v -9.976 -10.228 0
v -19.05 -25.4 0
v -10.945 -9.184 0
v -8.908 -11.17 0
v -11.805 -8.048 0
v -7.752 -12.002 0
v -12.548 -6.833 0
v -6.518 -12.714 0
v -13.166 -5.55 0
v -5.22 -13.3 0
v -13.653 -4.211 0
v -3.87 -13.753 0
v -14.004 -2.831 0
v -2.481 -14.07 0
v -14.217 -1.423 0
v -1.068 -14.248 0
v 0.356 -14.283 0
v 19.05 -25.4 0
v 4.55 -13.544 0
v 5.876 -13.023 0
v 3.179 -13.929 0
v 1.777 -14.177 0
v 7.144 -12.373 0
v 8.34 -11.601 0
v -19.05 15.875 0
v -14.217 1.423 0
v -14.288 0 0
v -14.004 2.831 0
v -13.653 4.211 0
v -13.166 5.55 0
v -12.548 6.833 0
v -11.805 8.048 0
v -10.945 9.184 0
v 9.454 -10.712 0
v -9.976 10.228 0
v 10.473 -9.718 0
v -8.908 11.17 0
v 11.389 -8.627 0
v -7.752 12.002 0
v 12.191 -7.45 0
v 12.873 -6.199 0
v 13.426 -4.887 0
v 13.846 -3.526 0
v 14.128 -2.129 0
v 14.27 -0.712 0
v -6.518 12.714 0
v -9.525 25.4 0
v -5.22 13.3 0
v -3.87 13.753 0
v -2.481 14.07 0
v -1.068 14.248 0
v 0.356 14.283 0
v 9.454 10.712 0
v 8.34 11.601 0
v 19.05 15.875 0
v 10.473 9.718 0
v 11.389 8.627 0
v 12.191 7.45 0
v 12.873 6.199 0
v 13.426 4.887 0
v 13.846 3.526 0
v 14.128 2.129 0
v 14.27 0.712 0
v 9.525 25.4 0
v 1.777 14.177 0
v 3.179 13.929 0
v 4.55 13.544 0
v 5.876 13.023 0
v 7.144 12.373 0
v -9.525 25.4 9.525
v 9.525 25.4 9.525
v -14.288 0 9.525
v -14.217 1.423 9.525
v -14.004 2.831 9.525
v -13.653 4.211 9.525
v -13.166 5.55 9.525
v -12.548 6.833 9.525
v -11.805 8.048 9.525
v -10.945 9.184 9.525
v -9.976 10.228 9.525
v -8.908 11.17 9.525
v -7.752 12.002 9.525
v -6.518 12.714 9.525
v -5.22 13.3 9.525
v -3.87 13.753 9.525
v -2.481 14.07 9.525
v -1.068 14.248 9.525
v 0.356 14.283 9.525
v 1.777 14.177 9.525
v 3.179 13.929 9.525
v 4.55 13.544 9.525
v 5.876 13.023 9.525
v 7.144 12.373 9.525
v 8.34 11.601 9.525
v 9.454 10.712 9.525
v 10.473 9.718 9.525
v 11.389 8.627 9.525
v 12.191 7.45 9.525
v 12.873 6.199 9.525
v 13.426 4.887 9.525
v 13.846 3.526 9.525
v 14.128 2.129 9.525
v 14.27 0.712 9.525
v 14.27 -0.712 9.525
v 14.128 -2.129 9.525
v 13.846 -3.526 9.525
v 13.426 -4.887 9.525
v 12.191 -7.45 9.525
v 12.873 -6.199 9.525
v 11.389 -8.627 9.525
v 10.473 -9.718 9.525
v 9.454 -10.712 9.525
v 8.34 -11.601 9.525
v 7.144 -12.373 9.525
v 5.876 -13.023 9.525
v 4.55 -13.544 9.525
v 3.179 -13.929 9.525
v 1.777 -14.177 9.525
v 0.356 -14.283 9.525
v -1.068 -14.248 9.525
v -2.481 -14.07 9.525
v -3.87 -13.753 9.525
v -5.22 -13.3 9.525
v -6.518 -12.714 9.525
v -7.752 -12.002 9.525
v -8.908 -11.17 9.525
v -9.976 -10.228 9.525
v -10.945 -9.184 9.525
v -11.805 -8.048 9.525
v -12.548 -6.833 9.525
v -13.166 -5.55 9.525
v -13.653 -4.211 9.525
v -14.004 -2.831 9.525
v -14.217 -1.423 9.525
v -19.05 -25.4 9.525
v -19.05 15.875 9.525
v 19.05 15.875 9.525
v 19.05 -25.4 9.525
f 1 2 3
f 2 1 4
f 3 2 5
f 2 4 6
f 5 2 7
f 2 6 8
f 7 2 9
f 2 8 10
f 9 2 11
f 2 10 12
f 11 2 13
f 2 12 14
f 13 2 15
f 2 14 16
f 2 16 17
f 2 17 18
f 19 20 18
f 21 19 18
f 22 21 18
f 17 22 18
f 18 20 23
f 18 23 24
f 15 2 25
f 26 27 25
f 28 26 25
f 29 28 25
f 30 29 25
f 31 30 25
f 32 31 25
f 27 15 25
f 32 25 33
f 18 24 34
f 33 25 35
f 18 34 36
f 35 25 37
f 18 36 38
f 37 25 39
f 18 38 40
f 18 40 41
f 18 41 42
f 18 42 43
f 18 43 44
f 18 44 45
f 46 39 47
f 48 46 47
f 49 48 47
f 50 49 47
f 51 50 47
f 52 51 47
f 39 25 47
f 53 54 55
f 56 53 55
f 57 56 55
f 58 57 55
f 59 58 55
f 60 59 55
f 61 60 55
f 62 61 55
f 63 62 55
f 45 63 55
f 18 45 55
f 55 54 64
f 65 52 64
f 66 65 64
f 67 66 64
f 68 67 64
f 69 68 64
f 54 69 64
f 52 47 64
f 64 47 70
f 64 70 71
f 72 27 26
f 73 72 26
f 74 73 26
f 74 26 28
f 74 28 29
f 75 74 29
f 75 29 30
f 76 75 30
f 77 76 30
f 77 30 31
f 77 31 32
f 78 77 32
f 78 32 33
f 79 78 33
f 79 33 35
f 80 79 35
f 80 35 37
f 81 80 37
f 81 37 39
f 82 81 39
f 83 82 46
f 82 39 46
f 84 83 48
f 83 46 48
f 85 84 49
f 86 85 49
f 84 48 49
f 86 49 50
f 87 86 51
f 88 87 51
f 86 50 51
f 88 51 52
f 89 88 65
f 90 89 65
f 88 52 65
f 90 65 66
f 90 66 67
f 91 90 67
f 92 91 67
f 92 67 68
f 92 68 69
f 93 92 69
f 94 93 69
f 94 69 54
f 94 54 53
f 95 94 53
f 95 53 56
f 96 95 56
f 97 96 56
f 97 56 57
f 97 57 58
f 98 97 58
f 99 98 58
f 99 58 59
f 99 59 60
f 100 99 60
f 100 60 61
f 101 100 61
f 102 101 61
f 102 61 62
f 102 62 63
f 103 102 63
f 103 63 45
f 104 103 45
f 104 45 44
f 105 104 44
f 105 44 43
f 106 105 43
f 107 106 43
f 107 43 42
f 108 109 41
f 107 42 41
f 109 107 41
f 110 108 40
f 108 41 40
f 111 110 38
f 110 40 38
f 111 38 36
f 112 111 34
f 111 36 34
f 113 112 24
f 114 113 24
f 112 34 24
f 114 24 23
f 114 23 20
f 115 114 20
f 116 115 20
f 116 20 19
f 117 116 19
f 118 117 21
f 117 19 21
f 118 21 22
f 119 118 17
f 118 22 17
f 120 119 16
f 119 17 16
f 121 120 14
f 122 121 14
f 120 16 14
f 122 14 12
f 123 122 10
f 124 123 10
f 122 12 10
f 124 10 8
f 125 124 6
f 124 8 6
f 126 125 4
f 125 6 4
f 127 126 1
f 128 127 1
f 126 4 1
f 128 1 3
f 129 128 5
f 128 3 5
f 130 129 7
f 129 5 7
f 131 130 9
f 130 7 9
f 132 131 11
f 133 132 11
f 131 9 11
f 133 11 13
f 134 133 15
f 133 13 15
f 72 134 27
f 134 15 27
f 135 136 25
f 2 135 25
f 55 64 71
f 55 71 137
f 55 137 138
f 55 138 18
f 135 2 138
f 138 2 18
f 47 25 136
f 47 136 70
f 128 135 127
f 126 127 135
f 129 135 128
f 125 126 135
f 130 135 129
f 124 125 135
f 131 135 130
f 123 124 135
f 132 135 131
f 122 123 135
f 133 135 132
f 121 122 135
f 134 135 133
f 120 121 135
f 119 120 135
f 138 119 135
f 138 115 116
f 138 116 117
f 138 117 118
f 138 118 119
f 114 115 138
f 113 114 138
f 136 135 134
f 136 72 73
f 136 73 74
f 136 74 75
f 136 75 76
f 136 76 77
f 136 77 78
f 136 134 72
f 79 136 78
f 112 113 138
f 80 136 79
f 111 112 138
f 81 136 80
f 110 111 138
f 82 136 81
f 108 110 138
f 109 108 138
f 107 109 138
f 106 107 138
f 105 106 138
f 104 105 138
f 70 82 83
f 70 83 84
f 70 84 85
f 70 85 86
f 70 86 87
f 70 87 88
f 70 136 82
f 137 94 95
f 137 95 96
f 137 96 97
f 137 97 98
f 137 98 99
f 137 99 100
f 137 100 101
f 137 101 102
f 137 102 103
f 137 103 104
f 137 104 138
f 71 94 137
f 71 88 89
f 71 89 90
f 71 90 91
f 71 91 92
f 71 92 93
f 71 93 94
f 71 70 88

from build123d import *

# Parameters (mm, degrees)
SKETCH1_W           = 38.1
SKETCH1_H           = 9.525
BOSS_EXTRUDE1_DEPTH = 25.4
SKETCH3_R           = 14.2875
CUT_EXTRUDE1_DEPTH  = 34.147973166
CUT_EXTRUDE2_DEPTH  = 34.147973166


with BuildPart() as part:
    # Sketch1 → Boss-Extrude1 (new, symmetric)
    with BuildSketch(Plane(origin=(0, 0, 0), x_dir=(1, 0, 0), z_dir=(0, 1, 0))):
        with Locations((0, -4.7625)):
            Rectangle(SKETCH1_W, SKETCH1_H)
    extrude(amount=BOSS_EXTRUDE1_DEPTH, both=True)

    # Sketch3 → Cut-Extrude1 (cut, through all)
    with BuildSketch(Plane(origin=(0, 0, 0), x_dir=(-1, 0, 0), z_dir=(0, 0, -1))):
        Circle(SKETCH3_R)
    extrude(amount=-CUT_EXTRUDE1_DEPTH, mode=Mode.SUBTRACT)

    # Sketch4 → Cut-Extrude2 (cut, through all)
    with BuildSketch(Plane(origin=(0, 0, 0), x_dir=(-1, 0, 0), z_dir=(0, 0, -1))):
        Polygon((-9.525, 25.4), (-19.05, 15.875), (-19.05, 25.4), align=None)
        Polygon((9.525, 25.4), (19.05, 25.4), (19.05, 15.875), align=None)
    extrude(amount=-CUT_EXTRUDE2_DEPTH, mode=Mode.SUBTRACT)


solid = part.part
